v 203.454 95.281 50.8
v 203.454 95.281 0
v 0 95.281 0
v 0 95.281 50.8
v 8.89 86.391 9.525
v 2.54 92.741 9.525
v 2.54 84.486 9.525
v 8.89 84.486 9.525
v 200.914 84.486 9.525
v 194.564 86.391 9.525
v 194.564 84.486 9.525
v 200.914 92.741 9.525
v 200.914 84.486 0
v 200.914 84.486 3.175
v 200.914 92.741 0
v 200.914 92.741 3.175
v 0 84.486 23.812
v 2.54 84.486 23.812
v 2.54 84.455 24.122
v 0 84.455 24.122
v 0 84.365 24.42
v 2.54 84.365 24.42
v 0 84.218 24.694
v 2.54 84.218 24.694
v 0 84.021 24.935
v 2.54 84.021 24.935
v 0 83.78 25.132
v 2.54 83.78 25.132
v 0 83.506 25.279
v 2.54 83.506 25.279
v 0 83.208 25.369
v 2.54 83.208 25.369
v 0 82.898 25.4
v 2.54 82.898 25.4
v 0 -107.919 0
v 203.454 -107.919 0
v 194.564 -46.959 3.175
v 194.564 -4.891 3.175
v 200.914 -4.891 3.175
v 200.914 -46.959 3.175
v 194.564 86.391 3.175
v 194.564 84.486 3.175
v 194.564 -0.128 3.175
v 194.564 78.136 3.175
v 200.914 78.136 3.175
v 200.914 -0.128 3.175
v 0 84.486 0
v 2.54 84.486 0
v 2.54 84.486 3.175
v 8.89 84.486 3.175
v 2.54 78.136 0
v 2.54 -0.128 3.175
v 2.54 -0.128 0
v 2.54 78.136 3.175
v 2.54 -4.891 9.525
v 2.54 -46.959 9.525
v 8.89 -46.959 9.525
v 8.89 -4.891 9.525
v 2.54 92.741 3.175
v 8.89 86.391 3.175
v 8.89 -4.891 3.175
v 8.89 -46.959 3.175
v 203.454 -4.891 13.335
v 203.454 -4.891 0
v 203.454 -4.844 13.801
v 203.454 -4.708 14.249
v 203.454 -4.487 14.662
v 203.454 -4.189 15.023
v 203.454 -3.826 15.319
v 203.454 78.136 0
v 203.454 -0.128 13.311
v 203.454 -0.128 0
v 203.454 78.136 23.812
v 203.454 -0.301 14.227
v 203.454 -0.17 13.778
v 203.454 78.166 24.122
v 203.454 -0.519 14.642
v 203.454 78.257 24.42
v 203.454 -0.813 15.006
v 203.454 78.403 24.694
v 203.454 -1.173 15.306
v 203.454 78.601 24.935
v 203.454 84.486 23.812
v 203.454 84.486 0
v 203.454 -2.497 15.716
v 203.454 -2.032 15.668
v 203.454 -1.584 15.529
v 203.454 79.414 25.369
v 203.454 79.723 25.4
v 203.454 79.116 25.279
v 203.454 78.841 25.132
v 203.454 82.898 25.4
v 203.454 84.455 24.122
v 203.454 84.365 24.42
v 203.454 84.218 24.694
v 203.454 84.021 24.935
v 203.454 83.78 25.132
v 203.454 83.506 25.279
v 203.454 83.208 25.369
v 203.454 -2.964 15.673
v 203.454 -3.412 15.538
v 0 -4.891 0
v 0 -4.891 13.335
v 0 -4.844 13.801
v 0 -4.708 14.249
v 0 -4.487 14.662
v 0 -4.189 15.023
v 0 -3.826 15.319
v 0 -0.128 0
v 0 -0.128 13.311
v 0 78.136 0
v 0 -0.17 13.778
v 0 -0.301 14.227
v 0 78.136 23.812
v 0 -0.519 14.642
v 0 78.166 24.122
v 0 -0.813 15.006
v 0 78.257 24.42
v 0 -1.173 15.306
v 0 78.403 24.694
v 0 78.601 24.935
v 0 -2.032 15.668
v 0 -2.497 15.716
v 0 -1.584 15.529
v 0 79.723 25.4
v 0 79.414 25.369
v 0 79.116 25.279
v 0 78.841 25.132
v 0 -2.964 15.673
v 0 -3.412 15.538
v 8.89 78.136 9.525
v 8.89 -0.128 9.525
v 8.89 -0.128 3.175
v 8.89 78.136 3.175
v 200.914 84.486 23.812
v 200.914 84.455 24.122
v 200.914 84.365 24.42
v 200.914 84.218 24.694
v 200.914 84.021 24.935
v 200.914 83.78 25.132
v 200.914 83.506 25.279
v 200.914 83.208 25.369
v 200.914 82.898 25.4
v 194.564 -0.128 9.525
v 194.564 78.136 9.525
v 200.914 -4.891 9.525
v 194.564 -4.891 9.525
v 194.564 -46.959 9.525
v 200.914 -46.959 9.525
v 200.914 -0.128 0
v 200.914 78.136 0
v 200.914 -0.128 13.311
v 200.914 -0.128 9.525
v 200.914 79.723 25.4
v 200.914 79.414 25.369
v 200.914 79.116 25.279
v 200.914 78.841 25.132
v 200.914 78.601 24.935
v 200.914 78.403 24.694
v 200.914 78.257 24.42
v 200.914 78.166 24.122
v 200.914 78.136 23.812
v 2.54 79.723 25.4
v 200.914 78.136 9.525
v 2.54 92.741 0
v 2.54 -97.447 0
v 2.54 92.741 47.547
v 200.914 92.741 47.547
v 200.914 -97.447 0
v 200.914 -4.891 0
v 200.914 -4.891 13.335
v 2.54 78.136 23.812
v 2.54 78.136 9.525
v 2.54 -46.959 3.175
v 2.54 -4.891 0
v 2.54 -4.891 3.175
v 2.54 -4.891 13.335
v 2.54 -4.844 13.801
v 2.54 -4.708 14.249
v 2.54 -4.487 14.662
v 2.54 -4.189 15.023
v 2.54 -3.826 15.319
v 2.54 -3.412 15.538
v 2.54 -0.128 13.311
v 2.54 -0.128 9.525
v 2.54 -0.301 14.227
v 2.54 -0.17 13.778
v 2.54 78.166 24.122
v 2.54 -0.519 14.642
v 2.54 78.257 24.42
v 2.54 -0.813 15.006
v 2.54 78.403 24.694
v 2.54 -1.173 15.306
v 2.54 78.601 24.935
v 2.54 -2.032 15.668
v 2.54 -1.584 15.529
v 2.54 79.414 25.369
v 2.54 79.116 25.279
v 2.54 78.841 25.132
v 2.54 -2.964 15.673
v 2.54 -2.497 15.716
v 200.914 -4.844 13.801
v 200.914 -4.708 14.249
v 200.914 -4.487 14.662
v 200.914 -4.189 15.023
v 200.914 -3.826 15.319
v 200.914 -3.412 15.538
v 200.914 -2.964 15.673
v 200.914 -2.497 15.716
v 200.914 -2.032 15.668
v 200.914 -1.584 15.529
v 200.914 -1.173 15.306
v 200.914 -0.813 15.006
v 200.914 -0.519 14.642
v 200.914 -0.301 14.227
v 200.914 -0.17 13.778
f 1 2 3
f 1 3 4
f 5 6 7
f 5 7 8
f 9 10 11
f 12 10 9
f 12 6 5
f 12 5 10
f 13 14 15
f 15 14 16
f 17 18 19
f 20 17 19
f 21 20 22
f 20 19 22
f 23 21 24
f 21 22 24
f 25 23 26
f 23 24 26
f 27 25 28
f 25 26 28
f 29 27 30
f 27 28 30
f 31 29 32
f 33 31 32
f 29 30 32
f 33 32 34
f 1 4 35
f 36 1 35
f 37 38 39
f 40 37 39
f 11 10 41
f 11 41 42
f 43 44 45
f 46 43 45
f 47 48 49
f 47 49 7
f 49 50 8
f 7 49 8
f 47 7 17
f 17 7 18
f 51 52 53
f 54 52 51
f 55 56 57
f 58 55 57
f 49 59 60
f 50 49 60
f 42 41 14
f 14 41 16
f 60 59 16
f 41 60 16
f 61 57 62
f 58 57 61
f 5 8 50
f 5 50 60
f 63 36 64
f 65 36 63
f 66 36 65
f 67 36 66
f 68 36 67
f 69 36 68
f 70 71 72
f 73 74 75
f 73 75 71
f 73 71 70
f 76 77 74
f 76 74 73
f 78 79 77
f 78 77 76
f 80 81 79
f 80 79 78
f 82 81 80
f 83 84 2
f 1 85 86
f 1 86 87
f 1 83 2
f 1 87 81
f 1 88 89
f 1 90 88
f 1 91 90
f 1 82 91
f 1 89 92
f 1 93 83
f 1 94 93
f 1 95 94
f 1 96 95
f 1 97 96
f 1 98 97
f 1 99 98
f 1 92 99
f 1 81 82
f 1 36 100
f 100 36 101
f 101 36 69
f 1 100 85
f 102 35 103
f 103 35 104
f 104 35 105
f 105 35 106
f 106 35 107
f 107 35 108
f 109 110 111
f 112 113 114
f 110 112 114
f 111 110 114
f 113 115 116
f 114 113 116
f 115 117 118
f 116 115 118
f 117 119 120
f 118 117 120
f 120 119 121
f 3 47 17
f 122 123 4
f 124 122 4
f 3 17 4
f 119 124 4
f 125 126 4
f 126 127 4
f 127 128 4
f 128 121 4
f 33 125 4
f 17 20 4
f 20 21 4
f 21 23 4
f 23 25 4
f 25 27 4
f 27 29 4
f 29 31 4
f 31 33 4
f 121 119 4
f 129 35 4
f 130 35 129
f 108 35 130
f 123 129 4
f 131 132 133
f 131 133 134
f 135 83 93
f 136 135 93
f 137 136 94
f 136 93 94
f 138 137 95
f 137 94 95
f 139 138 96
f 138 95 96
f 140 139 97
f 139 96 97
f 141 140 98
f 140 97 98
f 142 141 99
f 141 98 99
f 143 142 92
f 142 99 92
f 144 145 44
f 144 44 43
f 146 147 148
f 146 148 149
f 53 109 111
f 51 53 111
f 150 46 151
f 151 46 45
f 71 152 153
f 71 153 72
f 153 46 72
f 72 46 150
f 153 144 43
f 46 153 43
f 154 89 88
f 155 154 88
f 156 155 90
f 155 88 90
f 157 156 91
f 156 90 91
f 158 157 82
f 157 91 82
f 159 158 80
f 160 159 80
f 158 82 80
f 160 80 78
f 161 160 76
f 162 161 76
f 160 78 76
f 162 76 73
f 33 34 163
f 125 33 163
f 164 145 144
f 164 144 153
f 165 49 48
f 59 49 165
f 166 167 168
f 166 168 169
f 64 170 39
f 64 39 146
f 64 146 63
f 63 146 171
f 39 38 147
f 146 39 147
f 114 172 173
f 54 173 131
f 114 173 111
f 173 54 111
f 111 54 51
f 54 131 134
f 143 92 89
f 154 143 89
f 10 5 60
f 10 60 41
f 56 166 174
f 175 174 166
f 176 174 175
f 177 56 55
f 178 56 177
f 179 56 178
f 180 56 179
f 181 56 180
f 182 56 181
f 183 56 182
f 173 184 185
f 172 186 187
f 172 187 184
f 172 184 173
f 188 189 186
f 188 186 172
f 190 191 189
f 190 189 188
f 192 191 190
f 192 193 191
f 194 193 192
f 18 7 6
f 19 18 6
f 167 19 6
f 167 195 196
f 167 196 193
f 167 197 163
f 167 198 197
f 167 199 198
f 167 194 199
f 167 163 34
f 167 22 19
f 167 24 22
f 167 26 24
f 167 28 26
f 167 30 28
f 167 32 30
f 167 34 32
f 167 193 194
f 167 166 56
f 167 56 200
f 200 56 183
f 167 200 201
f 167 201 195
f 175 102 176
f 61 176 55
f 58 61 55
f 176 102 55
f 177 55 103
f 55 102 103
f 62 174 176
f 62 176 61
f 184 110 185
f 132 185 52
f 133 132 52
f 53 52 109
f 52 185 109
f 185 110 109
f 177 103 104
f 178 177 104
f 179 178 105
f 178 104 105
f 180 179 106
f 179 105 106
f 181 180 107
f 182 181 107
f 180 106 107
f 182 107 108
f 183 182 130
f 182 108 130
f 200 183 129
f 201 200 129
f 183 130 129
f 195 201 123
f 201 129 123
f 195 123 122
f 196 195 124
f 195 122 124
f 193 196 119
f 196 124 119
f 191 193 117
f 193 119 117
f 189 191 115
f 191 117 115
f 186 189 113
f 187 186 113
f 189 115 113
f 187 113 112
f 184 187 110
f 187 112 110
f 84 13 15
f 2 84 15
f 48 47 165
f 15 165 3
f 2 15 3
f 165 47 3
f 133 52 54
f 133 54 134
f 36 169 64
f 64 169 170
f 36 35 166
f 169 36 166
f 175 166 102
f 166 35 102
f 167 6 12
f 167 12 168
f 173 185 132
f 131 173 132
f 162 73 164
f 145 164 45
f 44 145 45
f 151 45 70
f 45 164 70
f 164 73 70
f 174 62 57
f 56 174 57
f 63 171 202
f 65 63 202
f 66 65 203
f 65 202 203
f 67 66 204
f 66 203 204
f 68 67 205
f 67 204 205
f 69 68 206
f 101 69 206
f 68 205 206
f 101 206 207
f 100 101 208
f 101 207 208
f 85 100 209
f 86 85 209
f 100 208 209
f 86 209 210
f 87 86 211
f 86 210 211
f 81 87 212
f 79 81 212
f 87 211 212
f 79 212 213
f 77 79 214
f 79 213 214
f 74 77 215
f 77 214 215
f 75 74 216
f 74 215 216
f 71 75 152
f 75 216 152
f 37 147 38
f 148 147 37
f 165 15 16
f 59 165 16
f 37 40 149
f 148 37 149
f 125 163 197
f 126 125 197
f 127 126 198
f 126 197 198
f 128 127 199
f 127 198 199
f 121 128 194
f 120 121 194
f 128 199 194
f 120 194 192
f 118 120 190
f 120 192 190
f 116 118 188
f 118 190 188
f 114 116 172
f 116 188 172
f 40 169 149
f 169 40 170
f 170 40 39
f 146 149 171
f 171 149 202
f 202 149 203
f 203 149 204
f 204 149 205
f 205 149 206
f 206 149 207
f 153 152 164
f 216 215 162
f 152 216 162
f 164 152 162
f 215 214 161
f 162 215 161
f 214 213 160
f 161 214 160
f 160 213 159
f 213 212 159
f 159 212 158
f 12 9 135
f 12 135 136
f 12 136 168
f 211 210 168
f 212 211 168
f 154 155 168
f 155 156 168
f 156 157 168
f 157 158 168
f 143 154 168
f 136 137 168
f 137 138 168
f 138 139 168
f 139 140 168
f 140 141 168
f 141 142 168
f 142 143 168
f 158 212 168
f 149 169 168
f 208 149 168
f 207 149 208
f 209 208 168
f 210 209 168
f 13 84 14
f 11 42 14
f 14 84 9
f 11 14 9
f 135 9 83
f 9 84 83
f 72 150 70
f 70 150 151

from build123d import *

# Parameters (mm, degrees)
F1_DEPTH  = 203.454
F2_T      = -2.54
F3_W      = 139.7
F3_H      = 6.35
F4_DEPTH  = 6.35
F5_W      = 139.7
F5_H      = 6.35
F6_DEPTH  = 6.35
F7_W      = 185.674
F7_H      = 6.35
F8_DEPTH  = 6.35
F10_DEPTH = 203.455
F12_DEPTH = 203.455


with BuildPart() as f1:
    # F0 (on Right) → F1 (new body)
    with BuildSketch(Plane.YZ):
        Polygon((-107.919275, 0), (95.280725, 0), (95.280725, 50.8), align=None)
    extrude(amount=F1_DEPTH)

    # F2
    f2_openings = [f1.faces().sort_by_distance(p)[0] for p in [
        (101.727, -6.319275, 0),
    ]]
    offset(amount=F2_T, openings=f2_openings)

    # F3 (on face) → F4 (join)
    with BuildSketch(Plane.YZ.offset(2.54)):
        with Locations((22.890725, 6.35)):
            Rectangle(F3_W, F3_H)
    extrude(amount=F4_DEPTH)

    # F5 (on face) → F6 (join)
    with BuildSketch(Plane(origin=(200.914, 0, 0), x_dir=(0, -1, 0), z_dir=(-1, 0, 0))):
        with Locations((-22.890725, 6.35)):
            Rectangle(F5_W, F5_H)
    extrude(amount=F6_DEPTH)

    # F7 (on face) → F8 (join)
    with BuildSketch(Plane.XZ.offset(-92.740725)):
        with Locations((101.727, 6.35)):
            Rectangle(F7_W, F7_H)
    extrude(amount=F8_DEPTH)

    # F9 (on face) → F10 (cut, through all)
    with BuildSketch(Plane.YZ.offset(203.454)):
        with BuildLine():
            Line((78.135725, 0), (84.485725, 0))
            Line((84.485725, 0), (84.485725, 23.8125))
            ThreePointArc((84.485725, 23.8125), (84.020757, 24.935032), (82.898225, 25.4))
            Line((82.898225, 25.4), (79.723225, 25.4))
            ThreePointArc((79.723225, 25.4), (78.600693, 24.935032), (78.135725, 23.8125))
            Line((78.135725, 23.8125), (78.135725, 0))
        make_face()
    extrude(amount=-F10_DEPTH, mode=Mode.SUBTRACT)

    # F11 (on face) → F12 (cut, through all)
    with BuildSketch(Plane(origin=(0, 0, 0), x_dir=(0, -1, 0), z_dir=(-1, 0, 0))):
        with BuildLine():
            ThreePointArc((0.128145, 13.311182), (2.521184, 10.95378), (4.890525, 13.335))
            ThreePointArc((4.890525, 13.335), (2.497366, 15.71622), (0.128145, 13.311182))
        make_face()
        with BuildLine():
            Line((4.890525, 0), (4.890525, 13.335))
            ThreePointArc((4.890525, 13.335), (2.521184, 10.95378), (0.128145, 13.311182))
            Line((0.128145, 13.311182), (0.128145, 0))
            Line((0.128145, 0), (4.890525, 0))
        make_face()
    extrude(amount=-F12_DEPTH, mode=Mode.SUBTRACT)


solid = f1.part
